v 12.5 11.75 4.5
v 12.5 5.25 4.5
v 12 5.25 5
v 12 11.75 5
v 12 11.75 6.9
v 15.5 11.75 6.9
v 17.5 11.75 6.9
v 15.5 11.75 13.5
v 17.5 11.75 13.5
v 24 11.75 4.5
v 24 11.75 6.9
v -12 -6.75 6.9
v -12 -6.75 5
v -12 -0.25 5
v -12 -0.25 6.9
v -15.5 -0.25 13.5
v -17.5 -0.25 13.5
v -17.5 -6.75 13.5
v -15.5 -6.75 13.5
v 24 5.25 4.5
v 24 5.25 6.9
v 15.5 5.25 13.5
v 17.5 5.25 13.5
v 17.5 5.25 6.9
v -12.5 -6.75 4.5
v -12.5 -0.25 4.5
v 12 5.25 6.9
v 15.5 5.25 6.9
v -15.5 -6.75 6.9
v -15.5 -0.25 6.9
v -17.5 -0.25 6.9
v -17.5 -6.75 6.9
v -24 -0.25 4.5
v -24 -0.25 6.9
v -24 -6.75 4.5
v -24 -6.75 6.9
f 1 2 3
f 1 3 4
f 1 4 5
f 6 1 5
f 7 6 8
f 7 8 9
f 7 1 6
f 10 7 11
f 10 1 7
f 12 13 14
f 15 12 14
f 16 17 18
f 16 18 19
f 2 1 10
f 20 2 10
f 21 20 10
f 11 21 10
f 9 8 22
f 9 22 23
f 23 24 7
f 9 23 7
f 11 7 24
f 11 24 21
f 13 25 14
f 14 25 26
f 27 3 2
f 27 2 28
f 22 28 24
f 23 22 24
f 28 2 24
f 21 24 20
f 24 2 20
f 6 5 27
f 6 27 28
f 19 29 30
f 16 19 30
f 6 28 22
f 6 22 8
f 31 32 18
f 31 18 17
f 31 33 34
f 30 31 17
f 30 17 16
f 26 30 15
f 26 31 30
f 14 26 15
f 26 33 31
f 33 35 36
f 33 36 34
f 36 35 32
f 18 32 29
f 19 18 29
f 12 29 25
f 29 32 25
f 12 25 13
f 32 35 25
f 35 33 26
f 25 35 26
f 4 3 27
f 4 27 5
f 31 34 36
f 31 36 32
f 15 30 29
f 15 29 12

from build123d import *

# Parameters (mm, degrees)
BOX038_W                                         = 2
BOX038_H                                         = 6.5
BOX038_DEPTH                                     = 9
BOX037_W                                         = 2
BOX037_H                                         = 6.5
BOX037_DEPTH                                     = 9
BOX007_W                                         = 12
BOX007_H                                         = 6.5
BOX007_DEPTH                                     = 2.4
BOX034_W                                         = 12
BOX034_H                                         = 6.5
BOX034_DEPTH                                     = 2.4
CHAMFER005021077002006007019003032007004002_SIZE = 0.5


with BuildPart() as cube034:
    # Box038 → Box038 (new body)
    with BuildSketch(Plane(origin=(-17.5, -6.75, 4.5), x_dir=(1, 0, 0), z_dir=(0, 0, 1))):
        with Locations((1, 3.25)):
            Rectangle(BOX038_W, BOX038_H)
    extrude(amount=BOX038_DEPTH)


with BuildPart() as cube033:
    # Box037 → Box037 (new body)
    with BuildSketch(Plane(origin=(15.5, 5.25, 4.5), x_dir=(1, 0, 0), z_dir=(0, 0, 1))):
        with Locations((1, 3.25)):
            Rectangle(BOX037_W, BOX037_H)
    extrude(amount=BOX037_DEPTH)


with BuildPart() as cube007:
    # Box007 → Box007 (new body)
    with BuildSketch(Plane(origin=(12, 5.25, 4.5), x_dir=(1, 0, 0), z_dir=(0, 0, 1))):
        with Locations((6, 3.25)):
            Rectangle(BOX007_W, BOX007_H)
    extrude(amount=BOX007_DEPTH)


with BuildPart() as belt_cut:
    # Box034 → Box034 (new body)
    with BuildSketch(Plane(origin=(-24, -6.75, 4.5), x_dir=(1, 0, 0), z_dir=(0, 0, 1))):
        with Locations((6, 3.25)):
            Rectangle(BOX034_W, BOX034_H)
    extrude(amount=BOX034_DEPTH)

    # Fusion001007011026006: union Cube007
    add(cube007.part)

    # Chamfer005021077002006007019003032007004002
    chamfer005021077002006007019003032007004002_edges = [belt_cut.edges().sort_by_distance(p)[0] for p in [
        (-12, -3.5, 4.5),
        (12, 8.5, 4.5),
    ]]
    chamfer(chamfer005021077002006007019003032007004002_edges, length=CHAMFER005021077002006007019003032007004002_SIZE)

    # Fusion001007011026007: union Cube034, Cube033
    add(cube034.part)
    add(cube033.part)


solid = belt_cut.part
